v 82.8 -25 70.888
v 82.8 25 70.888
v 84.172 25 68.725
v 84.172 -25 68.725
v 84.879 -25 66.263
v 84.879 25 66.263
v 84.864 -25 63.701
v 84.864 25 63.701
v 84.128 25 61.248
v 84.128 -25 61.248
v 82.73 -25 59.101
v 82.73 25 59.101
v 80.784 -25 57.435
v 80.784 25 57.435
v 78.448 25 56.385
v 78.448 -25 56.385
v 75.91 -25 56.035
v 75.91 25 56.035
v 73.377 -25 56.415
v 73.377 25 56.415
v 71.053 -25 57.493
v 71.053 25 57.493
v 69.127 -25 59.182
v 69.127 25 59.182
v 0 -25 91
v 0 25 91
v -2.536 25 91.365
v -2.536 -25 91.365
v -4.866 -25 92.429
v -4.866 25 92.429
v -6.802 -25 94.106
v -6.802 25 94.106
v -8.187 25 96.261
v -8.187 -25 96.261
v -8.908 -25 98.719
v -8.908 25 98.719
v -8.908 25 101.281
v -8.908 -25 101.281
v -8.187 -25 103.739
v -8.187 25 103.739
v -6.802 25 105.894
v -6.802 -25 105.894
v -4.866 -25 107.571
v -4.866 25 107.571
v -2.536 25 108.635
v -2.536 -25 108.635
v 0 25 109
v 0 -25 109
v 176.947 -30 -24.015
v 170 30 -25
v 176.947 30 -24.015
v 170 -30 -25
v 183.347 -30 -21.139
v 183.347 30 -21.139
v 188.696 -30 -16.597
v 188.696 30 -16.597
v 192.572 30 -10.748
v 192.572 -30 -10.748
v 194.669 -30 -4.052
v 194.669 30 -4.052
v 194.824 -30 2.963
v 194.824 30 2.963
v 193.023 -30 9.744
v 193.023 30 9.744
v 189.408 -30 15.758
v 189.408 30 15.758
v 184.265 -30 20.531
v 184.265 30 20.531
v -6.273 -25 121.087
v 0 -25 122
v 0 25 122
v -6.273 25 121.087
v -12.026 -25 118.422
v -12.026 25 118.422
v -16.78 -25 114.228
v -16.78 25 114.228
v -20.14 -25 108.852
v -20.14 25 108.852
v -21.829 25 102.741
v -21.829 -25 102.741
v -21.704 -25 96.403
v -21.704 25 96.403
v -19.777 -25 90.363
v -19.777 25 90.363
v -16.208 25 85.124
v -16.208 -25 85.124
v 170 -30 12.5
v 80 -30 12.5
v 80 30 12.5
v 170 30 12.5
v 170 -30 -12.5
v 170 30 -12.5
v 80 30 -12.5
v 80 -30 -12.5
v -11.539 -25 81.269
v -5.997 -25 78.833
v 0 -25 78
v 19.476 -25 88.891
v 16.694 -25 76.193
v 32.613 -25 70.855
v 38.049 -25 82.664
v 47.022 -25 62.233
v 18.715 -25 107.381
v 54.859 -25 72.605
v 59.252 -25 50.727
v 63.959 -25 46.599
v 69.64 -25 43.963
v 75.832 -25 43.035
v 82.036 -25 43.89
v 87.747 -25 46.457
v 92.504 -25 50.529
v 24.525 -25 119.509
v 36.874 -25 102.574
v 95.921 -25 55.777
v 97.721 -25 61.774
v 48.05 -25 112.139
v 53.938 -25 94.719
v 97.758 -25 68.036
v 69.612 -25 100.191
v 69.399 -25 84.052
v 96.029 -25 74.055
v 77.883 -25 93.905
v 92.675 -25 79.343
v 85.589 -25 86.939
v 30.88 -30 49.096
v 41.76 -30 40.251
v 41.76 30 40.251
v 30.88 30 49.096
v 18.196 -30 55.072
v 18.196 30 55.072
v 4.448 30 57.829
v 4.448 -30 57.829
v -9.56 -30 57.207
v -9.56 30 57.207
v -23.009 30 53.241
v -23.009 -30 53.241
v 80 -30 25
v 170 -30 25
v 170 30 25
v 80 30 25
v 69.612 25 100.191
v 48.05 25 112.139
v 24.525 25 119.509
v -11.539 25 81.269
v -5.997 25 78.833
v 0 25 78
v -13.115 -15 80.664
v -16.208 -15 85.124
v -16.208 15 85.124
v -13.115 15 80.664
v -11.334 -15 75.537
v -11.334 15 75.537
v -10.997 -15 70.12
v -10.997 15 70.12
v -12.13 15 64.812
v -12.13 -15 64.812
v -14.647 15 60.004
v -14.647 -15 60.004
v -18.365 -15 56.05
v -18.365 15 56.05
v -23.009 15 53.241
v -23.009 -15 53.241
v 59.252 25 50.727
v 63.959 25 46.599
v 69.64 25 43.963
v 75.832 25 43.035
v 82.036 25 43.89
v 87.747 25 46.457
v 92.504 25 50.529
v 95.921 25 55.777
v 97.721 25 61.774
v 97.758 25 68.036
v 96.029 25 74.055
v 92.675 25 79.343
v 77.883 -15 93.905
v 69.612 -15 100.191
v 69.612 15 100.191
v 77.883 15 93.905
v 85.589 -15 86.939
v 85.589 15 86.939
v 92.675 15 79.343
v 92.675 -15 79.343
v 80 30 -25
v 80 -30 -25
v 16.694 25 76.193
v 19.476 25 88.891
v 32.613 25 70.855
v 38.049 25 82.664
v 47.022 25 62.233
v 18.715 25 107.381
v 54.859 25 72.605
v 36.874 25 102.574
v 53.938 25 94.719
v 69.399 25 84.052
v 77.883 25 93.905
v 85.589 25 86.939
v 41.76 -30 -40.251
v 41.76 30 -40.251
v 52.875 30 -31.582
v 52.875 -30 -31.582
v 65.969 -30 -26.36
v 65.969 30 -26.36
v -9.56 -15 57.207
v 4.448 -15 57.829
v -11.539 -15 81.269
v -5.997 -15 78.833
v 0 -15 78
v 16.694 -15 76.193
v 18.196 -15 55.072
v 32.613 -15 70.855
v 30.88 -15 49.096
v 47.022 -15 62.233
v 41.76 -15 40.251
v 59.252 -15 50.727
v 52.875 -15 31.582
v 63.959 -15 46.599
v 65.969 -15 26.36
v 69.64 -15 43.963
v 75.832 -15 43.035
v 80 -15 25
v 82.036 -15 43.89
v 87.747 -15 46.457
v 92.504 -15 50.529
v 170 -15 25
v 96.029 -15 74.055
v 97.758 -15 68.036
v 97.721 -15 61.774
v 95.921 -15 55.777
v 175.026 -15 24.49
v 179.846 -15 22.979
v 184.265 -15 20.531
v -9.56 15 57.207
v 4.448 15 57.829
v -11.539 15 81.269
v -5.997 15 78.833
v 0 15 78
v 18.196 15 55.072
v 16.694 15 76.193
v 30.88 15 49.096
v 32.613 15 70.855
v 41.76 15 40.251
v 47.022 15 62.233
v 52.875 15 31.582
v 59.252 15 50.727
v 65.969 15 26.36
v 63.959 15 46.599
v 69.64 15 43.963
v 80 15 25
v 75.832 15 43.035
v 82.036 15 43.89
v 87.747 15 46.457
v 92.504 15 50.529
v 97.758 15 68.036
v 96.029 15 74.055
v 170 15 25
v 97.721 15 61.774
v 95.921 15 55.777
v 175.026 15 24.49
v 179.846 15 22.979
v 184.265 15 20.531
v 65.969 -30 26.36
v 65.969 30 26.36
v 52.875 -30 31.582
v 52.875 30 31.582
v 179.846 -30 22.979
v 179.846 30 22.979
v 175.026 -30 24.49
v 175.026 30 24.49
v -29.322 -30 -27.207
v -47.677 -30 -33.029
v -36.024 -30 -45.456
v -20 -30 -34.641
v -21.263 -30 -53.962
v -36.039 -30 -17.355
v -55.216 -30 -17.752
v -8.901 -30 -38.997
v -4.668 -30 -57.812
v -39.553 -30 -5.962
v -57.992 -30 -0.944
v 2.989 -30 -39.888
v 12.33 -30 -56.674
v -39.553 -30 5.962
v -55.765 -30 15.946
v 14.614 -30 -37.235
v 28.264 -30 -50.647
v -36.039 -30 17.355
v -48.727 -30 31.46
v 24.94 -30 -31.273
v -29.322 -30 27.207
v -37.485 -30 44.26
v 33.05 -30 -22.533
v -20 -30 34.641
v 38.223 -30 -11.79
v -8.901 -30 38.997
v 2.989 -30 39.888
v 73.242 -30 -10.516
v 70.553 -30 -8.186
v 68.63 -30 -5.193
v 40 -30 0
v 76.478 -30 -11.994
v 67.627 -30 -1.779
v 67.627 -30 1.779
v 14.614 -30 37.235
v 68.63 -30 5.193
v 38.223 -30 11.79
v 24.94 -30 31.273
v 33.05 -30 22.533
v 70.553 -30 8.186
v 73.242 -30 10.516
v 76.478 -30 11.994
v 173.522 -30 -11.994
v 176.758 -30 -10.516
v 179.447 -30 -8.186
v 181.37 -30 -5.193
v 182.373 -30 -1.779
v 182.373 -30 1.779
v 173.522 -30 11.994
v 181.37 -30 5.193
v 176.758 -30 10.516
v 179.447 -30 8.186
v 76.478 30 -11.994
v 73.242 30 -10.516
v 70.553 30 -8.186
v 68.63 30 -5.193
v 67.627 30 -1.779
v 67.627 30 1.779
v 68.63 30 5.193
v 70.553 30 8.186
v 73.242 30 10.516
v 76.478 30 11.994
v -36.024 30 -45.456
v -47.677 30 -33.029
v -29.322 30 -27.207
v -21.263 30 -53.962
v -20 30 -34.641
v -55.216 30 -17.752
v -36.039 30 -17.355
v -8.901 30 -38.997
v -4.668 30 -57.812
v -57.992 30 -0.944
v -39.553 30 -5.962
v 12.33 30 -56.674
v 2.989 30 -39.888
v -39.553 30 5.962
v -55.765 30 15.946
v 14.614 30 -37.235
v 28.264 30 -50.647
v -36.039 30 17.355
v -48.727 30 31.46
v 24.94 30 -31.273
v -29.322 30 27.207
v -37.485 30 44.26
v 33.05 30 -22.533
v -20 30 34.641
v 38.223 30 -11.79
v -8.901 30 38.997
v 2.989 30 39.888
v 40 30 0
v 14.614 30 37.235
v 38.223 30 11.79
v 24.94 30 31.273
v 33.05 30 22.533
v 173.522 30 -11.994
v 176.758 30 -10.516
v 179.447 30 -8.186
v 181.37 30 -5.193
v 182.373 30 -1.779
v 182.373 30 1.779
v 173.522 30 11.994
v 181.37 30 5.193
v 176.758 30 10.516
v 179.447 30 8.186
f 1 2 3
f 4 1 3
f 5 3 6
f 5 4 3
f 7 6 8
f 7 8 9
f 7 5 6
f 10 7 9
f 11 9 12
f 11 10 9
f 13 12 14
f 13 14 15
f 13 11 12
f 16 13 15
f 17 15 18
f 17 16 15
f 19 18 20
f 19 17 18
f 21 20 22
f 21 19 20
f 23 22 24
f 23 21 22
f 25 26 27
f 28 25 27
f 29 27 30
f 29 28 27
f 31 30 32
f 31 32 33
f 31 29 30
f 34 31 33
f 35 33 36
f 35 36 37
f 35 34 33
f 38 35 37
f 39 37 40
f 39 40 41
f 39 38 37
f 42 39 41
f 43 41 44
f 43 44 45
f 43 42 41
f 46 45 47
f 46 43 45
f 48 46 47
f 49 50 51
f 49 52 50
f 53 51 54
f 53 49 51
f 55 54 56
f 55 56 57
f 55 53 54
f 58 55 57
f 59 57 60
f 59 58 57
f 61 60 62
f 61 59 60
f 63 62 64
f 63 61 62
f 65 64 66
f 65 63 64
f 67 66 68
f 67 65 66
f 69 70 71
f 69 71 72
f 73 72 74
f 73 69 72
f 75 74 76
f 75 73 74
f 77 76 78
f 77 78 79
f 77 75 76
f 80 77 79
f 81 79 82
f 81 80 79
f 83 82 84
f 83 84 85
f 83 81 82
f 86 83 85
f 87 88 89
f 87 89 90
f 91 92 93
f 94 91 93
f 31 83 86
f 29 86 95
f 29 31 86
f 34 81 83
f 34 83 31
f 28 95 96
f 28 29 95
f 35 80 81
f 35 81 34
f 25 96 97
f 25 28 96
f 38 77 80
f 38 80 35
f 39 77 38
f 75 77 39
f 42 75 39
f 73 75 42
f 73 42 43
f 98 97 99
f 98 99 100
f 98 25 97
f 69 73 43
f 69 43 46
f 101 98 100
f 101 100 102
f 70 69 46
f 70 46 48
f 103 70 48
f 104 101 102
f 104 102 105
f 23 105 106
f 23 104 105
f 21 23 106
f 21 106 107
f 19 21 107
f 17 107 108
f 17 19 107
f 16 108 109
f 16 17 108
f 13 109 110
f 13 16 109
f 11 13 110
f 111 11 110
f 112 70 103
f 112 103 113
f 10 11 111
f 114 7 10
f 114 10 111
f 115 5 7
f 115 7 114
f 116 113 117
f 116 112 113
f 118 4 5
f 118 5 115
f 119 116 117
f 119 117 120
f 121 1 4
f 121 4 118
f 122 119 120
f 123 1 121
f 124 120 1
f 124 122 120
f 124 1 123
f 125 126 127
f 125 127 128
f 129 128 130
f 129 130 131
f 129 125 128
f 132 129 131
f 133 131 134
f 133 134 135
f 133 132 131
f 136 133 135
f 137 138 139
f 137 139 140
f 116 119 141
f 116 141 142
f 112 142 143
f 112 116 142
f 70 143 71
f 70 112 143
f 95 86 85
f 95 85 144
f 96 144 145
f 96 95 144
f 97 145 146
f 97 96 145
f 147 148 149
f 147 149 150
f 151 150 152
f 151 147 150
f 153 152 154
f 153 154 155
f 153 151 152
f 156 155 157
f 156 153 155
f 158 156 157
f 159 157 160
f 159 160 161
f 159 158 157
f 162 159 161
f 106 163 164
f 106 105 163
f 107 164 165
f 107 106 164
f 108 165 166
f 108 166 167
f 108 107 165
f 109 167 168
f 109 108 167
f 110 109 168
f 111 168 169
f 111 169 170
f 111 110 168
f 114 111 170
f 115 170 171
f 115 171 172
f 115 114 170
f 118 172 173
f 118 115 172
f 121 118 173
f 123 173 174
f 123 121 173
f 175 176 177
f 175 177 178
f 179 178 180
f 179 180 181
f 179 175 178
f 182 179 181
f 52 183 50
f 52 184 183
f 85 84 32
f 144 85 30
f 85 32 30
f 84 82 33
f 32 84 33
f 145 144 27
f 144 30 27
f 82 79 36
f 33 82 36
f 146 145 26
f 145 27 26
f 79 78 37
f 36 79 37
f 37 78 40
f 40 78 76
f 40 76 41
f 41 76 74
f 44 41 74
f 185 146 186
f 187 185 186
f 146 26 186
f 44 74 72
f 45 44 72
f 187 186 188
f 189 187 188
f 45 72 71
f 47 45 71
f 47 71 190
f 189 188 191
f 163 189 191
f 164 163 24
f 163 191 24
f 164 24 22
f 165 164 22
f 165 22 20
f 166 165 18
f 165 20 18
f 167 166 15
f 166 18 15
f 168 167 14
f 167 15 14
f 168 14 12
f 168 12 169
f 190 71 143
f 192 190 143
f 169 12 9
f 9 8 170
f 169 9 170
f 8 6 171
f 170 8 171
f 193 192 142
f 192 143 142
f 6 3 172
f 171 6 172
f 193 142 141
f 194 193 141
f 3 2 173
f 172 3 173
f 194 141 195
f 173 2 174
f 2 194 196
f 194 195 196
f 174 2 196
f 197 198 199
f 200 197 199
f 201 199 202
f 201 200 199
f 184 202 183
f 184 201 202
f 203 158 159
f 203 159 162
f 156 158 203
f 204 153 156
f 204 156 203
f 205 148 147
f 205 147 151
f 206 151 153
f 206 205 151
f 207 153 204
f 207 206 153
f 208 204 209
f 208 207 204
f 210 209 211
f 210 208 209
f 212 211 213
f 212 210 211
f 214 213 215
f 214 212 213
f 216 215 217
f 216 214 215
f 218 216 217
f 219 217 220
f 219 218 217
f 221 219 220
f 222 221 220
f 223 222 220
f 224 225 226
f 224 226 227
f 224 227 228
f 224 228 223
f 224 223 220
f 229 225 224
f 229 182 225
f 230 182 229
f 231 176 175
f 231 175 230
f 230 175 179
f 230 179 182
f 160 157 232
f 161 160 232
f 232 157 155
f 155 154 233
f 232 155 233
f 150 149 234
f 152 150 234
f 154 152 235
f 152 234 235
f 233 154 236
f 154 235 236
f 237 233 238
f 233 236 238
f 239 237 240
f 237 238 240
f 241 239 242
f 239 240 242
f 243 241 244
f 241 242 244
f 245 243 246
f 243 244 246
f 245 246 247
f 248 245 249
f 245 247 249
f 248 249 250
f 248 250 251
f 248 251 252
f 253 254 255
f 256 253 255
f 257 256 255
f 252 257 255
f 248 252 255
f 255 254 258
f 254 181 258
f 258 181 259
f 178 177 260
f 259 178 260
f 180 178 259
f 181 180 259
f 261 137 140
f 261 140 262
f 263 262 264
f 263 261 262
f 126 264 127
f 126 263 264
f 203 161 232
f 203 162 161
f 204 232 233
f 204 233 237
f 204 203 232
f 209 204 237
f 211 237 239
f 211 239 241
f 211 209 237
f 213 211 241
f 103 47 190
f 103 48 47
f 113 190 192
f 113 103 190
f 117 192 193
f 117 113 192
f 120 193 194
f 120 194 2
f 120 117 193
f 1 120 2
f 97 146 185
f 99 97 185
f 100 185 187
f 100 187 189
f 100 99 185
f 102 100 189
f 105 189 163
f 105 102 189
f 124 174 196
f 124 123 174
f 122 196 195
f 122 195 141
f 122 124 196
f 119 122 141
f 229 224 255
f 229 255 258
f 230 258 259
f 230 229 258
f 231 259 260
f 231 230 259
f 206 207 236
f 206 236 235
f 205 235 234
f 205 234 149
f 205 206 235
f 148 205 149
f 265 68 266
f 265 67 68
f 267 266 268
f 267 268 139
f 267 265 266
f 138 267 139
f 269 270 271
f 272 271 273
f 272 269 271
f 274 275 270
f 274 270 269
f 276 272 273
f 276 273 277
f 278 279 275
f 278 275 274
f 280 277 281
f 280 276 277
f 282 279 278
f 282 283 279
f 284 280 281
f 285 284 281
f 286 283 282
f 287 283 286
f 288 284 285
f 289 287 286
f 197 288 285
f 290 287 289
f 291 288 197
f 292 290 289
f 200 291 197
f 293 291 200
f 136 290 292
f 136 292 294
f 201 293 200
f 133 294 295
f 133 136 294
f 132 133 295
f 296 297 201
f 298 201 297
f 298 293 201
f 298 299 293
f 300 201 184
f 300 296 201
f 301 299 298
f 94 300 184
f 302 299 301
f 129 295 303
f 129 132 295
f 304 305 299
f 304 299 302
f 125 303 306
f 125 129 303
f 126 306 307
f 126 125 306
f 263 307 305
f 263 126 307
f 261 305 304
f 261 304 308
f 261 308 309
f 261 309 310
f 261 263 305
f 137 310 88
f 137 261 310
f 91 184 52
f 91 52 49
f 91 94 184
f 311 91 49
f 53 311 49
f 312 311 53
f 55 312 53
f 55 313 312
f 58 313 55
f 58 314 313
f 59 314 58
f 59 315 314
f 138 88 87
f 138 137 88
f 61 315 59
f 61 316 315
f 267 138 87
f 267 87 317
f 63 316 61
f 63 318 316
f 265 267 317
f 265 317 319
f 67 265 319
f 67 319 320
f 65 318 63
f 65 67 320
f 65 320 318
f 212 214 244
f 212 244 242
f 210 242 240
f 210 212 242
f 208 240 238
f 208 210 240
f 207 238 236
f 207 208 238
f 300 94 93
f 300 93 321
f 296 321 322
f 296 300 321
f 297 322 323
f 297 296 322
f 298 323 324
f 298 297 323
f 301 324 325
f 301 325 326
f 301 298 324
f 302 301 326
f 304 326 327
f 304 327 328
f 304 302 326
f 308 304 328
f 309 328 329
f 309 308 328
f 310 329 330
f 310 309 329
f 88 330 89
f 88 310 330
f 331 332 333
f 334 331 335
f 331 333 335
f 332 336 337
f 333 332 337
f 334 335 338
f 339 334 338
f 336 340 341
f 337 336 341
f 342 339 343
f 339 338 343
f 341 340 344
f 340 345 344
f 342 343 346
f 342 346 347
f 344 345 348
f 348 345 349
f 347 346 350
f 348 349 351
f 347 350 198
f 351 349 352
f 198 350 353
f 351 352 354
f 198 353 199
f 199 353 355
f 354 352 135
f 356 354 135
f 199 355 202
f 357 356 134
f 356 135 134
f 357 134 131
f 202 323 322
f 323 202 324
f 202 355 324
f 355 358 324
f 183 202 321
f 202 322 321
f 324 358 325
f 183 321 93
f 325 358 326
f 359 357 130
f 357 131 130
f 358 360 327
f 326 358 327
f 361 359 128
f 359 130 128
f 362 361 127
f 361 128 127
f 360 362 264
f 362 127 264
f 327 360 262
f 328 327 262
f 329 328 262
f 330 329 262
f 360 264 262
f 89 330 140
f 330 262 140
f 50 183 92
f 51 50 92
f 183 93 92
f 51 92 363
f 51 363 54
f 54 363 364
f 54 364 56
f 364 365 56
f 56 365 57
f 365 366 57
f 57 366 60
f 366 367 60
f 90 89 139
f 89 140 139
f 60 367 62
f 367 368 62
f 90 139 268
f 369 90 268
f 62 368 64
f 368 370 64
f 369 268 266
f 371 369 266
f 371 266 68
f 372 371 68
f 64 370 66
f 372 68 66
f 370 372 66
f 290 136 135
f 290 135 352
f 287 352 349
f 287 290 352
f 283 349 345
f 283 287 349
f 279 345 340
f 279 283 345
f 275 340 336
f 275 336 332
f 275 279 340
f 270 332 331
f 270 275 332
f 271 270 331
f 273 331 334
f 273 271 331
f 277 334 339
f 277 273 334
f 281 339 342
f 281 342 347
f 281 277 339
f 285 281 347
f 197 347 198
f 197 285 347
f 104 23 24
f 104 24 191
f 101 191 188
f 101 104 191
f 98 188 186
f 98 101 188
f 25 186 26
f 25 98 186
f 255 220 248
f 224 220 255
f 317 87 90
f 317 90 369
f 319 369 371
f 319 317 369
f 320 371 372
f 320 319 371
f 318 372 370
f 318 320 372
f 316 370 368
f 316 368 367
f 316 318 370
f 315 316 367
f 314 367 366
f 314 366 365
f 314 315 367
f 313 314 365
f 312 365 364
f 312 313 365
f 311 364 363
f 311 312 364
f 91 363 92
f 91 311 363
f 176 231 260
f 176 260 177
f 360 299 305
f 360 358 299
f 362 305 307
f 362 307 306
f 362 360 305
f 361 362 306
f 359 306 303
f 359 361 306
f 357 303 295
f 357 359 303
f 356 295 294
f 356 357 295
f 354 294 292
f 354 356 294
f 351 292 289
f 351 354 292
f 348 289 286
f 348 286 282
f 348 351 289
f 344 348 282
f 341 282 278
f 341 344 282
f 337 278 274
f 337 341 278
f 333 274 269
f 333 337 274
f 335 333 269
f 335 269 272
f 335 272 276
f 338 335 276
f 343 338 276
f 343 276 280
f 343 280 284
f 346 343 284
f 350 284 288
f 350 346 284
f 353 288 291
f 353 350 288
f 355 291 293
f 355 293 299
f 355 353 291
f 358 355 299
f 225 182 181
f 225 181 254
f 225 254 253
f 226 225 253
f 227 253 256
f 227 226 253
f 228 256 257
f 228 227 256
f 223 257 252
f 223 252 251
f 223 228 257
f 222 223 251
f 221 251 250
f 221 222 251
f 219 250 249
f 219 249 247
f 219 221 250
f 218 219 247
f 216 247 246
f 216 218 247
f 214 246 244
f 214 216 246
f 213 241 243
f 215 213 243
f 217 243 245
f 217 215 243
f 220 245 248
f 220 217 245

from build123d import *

# Parameters (mm, degrees)
F0_R     = 40
F1_DEPTH = 30
F2_DEPTH = 25
F3_DEPTH = 15


with BuildPart() as f1:
    # F0 (on Front) → F1 (new body, symmetric)
    with BuildSketch(Plane.XZ):
        with BuildLine():
            ThreePointArc((184.264706, 20.530908), (177.474199, 23.856579), (170, 25))
            Line((170, 25), (80, 25))
            ThreePointArc((80, 25), (59.237365, 28.506986), (41.759702, 40.250805))
            ThreePointArc((41.759702, 40.250805), (11.405609, 56.867496), (-23.008546, 53.241026))
            ThreePointArc((-23.008546, 53.241026), (-47.67685, -33.029047), (41.759702, -40.250805))
            ThreePointArc((41.759702, -40.250805), (59.237365, -28.506986), (80, -25))
            Line((80, -25), (170, -25))
            ThreePointArc((170, -25), (193.856579, -7.474199), (184.264706, 20.530908))
        make_face()
        Circle(F0_R, mode=Mode.SUBTRACT)
        with BuildLine():
            Line((170, -12.5), (80, -12.5))
            ThreePointArc((80, -12.5), (67.5, 0), (80, 12.5))
            Line((80, 12.5), (170, 12.5))
            ThreePointArc((170, 12.5), (182.5, 0), (170, -12.5))
        make_face(mode=Mode.SUBTRACT)
    extrude(amount=F1_DEPTH, both=True)


with BuildPart() as f2:
    # F0 (on Front) → F2 (new body, symmetric)
    with BuildSketch(Plane.XZ):
        with BuildLine():
            ThreePointArc((92.675427, 79.342707), (81.810416, 90.504452), (69.611765, 100.190829))
            ThreePointArc((69.611765, 100.190829), (36.474093, 116.420104), (0, 122))
            ThreePointArc((0, 122), (-20.140459, 108.852226), (-16.207991, 85.12381))
            ThreePointArc((-16.207991, 85.12381), (-8.852226, 79.859541), (0, 78))
            ThreePointArc((0, 78), (32.613419, 70.854533), (59.251503, 50.727305))
            ThreePointArc((59.251503, 50.727305), (90.271166, 48.323044), (92.675427, 79.342707))
        make_face()
        with BuildLine():
            ThreePointArc((69.126753, 59.181855), (38.048989, 82.663622), (0, 91))
            ThreePointArc((0, 91), (-9, 100), (0, 109))
            ThreePointArc((0, 109), (45.575163, 99.014668), (82.800177, 70.888156))
            ThreePointArc((82.800177, 70.888156), (81.816616, 58.198294), (69.126753, 59.181855))
        make_face(mode=Mode.SUBTRACT)
    extrude(amount=F2_DEPTH, both=True)


with BuildPart() as f3:
    # F0 (on Front) → F3 (new body, symmetric)
    with BuildSketch(Plane.XZ):
        with BuildLine():
            Line((80, 25), (170, 25))
            ThreePointArc((170, 25), (177.474199, 23.856579), (184.264706, 20.530908))
            Line((184.264706, 20.530908), (69.611765, 100.190829))
            ThreePointArc((69.611765, 100.190829), (81.810416, 90.504452), (92.675427, 79.342707))
            ThreePointArc((92.675427, 79.342707), (90.271166, 48.323044), (59.251503, 50.727305))
            ThreePointArc((59.251503, 50.727305), (32.613419, 70.854533), (0, 78))
            ThreePointArc((0, 78), (-8.852226, 79.859541), (-16.207991, 85.12381))
            ThreePointArc((-16.207991, 85.12381), (-11.382532, 67.427879), (-23.008546, 53.241026))
            ThreePointArc((-23.008546, 53.241026), (11.405609, 56.867496), (41.759702, 40.250805))
            ThreePointArc((41.759702, 40.250805), (59.237365, 28.506986), (80, 25))
        make_face()
    extrude(amount=F3_DEPTH, both=True)


solid = Compound([f1.part, f2.part, f3.part])
